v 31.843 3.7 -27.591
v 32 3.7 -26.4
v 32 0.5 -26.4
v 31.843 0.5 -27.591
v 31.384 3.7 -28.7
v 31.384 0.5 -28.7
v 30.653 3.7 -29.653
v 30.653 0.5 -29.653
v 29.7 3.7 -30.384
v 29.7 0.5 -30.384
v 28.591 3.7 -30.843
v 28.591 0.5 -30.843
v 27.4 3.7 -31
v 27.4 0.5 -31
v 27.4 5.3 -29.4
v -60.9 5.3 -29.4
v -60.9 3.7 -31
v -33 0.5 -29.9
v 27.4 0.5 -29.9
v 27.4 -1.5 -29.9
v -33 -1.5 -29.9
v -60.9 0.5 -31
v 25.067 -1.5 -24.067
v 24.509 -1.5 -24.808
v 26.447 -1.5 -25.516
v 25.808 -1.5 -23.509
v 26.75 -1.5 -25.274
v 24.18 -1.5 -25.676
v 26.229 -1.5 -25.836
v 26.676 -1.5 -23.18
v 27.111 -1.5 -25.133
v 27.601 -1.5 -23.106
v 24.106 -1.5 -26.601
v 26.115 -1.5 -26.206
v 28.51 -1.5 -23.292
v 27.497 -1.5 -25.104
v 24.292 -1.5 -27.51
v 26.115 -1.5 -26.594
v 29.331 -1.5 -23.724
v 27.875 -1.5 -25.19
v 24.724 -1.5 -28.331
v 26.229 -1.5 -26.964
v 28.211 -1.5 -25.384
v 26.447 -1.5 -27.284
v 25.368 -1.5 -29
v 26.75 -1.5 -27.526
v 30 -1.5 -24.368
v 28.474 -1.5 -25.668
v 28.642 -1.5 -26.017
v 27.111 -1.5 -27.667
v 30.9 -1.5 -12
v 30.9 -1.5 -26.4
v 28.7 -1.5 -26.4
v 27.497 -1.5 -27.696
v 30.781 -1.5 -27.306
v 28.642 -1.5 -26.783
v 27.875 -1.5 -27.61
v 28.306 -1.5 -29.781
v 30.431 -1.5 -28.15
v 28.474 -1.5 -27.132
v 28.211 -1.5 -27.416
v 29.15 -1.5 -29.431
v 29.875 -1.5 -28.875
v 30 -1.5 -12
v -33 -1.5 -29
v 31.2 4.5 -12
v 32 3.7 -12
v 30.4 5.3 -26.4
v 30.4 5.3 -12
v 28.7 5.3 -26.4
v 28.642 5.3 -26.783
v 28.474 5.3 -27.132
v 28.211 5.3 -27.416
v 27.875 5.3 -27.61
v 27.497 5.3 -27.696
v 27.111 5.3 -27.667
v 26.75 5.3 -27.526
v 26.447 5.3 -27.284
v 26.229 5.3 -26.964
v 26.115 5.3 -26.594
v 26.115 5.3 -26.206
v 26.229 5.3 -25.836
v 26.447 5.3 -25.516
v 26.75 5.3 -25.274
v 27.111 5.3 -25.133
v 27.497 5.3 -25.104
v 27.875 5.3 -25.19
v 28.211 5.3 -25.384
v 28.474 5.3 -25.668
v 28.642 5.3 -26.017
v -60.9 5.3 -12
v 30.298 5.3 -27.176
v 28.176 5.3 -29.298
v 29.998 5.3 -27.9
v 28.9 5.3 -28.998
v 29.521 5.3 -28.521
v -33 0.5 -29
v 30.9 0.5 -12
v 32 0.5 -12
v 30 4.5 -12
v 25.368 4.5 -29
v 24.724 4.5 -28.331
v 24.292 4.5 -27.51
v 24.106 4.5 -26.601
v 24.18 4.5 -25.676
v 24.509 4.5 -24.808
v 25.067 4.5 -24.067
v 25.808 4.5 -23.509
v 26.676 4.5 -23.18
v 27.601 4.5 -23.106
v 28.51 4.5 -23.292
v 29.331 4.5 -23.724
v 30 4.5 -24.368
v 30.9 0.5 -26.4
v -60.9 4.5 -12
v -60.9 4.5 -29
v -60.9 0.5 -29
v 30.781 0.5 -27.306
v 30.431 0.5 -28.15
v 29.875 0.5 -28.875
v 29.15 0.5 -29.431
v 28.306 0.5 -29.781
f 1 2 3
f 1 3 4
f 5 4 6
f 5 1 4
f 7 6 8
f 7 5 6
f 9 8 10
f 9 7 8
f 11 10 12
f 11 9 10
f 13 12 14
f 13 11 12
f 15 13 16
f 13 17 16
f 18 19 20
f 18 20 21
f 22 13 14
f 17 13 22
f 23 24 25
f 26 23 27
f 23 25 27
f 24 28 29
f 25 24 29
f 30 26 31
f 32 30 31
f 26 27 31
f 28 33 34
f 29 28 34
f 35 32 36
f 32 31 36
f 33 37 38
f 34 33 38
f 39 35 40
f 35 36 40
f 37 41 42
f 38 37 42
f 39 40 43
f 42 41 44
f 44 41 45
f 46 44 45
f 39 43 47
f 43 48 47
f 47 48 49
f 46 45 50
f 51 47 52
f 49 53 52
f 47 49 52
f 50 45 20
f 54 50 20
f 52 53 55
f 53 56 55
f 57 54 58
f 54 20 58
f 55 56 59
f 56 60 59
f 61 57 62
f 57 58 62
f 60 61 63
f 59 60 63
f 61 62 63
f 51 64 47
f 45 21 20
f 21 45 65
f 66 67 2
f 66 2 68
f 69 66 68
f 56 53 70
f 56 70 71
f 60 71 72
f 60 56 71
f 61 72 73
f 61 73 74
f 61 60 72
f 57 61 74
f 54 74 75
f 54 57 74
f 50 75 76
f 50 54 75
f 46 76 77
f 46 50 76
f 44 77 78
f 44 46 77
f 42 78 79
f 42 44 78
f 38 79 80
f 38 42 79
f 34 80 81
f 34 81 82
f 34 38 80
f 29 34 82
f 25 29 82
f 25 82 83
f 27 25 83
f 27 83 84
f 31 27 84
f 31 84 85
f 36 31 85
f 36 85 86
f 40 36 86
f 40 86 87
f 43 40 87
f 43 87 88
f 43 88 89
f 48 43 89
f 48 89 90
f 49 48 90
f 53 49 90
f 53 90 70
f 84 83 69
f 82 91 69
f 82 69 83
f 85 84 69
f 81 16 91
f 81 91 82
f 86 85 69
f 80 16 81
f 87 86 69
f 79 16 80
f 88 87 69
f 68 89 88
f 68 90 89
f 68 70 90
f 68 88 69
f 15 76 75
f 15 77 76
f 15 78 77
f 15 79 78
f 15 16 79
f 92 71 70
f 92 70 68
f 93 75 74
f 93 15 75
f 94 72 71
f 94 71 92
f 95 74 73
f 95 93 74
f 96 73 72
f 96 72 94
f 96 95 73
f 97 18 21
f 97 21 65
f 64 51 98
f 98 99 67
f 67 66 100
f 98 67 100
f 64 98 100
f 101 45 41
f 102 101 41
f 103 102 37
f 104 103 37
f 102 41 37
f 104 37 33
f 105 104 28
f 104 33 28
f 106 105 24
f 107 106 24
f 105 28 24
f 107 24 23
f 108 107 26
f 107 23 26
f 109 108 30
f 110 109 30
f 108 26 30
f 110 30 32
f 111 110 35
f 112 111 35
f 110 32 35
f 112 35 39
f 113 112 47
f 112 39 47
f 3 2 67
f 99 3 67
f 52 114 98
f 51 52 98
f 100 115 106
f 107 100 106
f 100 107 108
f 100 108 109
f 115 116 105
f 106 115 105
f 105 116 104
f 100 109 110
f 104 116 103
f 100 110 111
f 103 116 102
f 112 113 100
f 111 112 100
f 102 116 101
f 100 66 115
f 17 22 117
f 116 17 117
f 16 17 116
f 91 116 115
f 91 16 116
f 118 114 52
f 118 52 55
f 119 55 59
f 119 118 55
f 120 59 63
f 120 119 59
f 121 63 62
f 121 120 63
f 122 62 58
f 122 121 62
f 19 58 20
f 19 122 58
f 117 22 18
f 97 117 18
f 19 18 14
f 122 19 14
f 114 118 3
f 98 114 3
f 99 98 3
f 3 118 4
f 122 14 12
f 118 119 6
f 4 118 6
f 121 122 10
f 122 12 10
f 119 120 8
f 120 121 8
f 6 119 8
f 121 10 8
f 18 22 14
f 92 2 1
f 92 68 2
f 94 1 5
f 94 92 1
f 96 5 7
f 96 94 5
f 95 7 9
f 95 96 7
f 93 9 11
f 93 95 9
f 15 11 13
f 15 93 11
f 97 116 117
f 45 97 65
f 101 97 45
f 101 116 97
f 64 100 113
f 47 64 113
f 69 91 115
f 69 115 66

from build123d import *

# Parameters (mm, degrees)
SKETCH005_R      = 1.3
EXTRUDE003_DEPTH = 20
EXTRUDE039_DEPTH = 4
EXTRUDE042_DEPTH = 0.8
EXTRUDE002_DEPTH = 6
EXTRUDE037_DEPTH = 2


with BuildPart() as sweep001:
    # Sweep001: sweep along a path in Sketch034
    with BuildLine(Plane.XZ.offset(10)) as sweep001_path:
        Line((32, 11.999174), (32, 26.4))
        ThreePointArc((32, 26.4), (30.652691, 29.652691), (27.4, 31))
        Line((27.4, 31), (-60.9, 31))
    # Sketch035 → Sweep001 (sweep)
    with BuildSketch(Plane.YZ):
        Polygon((5.3, 29.4), (3.7, 31), (3.7, 32), (6, 32), (6, 29.4), align=None)
    sweep(path=sweep001_path.line)


with BuildPart() as fusion030:
    # Sketch005 → Extrude003 (new body)
    with BuildSketch(Plane.XZ.offset(5)):
        with Locations((27.4, 26.4)):
            Circle(SKETCH005_R)
    extrude(amount=-EXTRUDE003_DEPTH)


with BuildPart() as fusion030_1:
    # Extrude003 placement: moved
    add(fusion030.part.moved(Location((0, -4, 0))))

    # Fusion030: union Sweep001
    add(sweep001.part)


with BuildPart() as top003:
    # Sketch028 → Extrude039 (new body)
    with BuildSketch(Plane.XZ.offset(10)):
        with BuildLine():
            ThreePointArc((32, 26.4), (30.652691, 29.652691), (27.4, 31))
            Line((27.4, 31), (-60.9, 31))
            Line((-60.9, 31), (-60.9, 29))
            Line((-60.9, 29), (27.4, 29))
            ThreePointArc((30, 26.4), (29.238478, 28.238478), (27.4, 29))
            Line((30, 12), (30, 26.4))
            Line((32, 12), (30, 12))
            Line((32, 26.4), (32, 12))
        make_face()
    extrude(amount=EXTRUDE039_DEPTH)


with BuildPart() as top003_1:
    # Extrude039 placement: moved
    add(top003.part.moved(Location((0, 14.5, 0))))


with BuildPart() as top002:
    # Sketch031 → Extrude042 (new body)
    with BuildSketch(Plane.XZ.offset(10)):
        with BuildLine():
            ThreePointArc((32, 26.399981), (30.652691, 29.652672), (27.4, 30.999981))
            Line((27.4, 30.999981), (-60.9, 30.999981))
            Line((-60.9, 30.999981), (-60.9, 11.999981))
            Line((-60.9, 11.999981), (32, 11.999981))
            Line((32, 26.399981), (32, 11.999981))
        make_face()
    extrude(amount=EXTRUDE042_DEPTH)


with BuildPart() as top002_1:
    # Extrude042 placement: moved
    add(top002.part.moved(Location((0, 15.3, 0))))


with BuildPart() as screw_hole_top:
    # Sketch004 → Extrude002 (new body)
    with BuildSketch(Plane.XZ.offset(10)):
        with BuildLine():
            ThreePointArc((25.36776, 29), (25.066548, 24.066548), (30, 24.36776))
            Line((30, 24.36776), (30, 26.4))
            ThreePointArc((30, 26.4), (29.238478, 28.238478), (27.4, 29))
            Line((25.36776, 29), (27.4, 29))
        make_face()
    extrude(amount=-EXTRUDE002_DEPTH)


with BuildPart() as screw_hole_top_1:
    # Extrude002 placement: moved
    add(screw_hole_top.part.moved(Location((0, 8.5, 0))))


with BuildPart() as top:
    # Sketch029 → Extrude037 (new body)
    with BuildSketch(Plane.XZ.offset(10)):
        with BuildLine():
            ThreePointArc((30.9, 26.4), (29.874874, 28.874874), (27.4, 29.9))
            Line((27.4, 29.9), (-33, 29.9))
            Line((-33, 29.9), (-33, 29))
            Line((-33, 29), (27.4, 29))
            ThreePointArc((30, 26.4), (29.238478, 28.238478), (27.4, 29))
            Line((30, 12), (30, 26.4))
            Line((30.9, 12), (30, 12))
            Line((30.9, 26.4), (30.9, 12))
        make_face()
    extrude(amount=EXTRUDE037_DEPTH)


with BuildPart() as top_1:
    # Extrude037 placement: moved
    add(top.part.moved(Location((0, 10.5, 0))))

    # Fusion028: union top003, top002, screw hole top
    add(top003_1.part)
    add(top002_1.part)
    add(screw_hole_top_1.part)

    # Cut024: cut Fusion030
    add(fusion030_1.part, mode=Mode.SUBTRACT)


with BuildPart() as part_mirroring001:
    # Part__Mirroring001: instance of top
    add(top_1.part.mirror(Plane(origin=(0, 0, 0), x_dir=(0, 1, 0), z_dir=(0, 0, 1))))


solid = part_mirroring001.part
